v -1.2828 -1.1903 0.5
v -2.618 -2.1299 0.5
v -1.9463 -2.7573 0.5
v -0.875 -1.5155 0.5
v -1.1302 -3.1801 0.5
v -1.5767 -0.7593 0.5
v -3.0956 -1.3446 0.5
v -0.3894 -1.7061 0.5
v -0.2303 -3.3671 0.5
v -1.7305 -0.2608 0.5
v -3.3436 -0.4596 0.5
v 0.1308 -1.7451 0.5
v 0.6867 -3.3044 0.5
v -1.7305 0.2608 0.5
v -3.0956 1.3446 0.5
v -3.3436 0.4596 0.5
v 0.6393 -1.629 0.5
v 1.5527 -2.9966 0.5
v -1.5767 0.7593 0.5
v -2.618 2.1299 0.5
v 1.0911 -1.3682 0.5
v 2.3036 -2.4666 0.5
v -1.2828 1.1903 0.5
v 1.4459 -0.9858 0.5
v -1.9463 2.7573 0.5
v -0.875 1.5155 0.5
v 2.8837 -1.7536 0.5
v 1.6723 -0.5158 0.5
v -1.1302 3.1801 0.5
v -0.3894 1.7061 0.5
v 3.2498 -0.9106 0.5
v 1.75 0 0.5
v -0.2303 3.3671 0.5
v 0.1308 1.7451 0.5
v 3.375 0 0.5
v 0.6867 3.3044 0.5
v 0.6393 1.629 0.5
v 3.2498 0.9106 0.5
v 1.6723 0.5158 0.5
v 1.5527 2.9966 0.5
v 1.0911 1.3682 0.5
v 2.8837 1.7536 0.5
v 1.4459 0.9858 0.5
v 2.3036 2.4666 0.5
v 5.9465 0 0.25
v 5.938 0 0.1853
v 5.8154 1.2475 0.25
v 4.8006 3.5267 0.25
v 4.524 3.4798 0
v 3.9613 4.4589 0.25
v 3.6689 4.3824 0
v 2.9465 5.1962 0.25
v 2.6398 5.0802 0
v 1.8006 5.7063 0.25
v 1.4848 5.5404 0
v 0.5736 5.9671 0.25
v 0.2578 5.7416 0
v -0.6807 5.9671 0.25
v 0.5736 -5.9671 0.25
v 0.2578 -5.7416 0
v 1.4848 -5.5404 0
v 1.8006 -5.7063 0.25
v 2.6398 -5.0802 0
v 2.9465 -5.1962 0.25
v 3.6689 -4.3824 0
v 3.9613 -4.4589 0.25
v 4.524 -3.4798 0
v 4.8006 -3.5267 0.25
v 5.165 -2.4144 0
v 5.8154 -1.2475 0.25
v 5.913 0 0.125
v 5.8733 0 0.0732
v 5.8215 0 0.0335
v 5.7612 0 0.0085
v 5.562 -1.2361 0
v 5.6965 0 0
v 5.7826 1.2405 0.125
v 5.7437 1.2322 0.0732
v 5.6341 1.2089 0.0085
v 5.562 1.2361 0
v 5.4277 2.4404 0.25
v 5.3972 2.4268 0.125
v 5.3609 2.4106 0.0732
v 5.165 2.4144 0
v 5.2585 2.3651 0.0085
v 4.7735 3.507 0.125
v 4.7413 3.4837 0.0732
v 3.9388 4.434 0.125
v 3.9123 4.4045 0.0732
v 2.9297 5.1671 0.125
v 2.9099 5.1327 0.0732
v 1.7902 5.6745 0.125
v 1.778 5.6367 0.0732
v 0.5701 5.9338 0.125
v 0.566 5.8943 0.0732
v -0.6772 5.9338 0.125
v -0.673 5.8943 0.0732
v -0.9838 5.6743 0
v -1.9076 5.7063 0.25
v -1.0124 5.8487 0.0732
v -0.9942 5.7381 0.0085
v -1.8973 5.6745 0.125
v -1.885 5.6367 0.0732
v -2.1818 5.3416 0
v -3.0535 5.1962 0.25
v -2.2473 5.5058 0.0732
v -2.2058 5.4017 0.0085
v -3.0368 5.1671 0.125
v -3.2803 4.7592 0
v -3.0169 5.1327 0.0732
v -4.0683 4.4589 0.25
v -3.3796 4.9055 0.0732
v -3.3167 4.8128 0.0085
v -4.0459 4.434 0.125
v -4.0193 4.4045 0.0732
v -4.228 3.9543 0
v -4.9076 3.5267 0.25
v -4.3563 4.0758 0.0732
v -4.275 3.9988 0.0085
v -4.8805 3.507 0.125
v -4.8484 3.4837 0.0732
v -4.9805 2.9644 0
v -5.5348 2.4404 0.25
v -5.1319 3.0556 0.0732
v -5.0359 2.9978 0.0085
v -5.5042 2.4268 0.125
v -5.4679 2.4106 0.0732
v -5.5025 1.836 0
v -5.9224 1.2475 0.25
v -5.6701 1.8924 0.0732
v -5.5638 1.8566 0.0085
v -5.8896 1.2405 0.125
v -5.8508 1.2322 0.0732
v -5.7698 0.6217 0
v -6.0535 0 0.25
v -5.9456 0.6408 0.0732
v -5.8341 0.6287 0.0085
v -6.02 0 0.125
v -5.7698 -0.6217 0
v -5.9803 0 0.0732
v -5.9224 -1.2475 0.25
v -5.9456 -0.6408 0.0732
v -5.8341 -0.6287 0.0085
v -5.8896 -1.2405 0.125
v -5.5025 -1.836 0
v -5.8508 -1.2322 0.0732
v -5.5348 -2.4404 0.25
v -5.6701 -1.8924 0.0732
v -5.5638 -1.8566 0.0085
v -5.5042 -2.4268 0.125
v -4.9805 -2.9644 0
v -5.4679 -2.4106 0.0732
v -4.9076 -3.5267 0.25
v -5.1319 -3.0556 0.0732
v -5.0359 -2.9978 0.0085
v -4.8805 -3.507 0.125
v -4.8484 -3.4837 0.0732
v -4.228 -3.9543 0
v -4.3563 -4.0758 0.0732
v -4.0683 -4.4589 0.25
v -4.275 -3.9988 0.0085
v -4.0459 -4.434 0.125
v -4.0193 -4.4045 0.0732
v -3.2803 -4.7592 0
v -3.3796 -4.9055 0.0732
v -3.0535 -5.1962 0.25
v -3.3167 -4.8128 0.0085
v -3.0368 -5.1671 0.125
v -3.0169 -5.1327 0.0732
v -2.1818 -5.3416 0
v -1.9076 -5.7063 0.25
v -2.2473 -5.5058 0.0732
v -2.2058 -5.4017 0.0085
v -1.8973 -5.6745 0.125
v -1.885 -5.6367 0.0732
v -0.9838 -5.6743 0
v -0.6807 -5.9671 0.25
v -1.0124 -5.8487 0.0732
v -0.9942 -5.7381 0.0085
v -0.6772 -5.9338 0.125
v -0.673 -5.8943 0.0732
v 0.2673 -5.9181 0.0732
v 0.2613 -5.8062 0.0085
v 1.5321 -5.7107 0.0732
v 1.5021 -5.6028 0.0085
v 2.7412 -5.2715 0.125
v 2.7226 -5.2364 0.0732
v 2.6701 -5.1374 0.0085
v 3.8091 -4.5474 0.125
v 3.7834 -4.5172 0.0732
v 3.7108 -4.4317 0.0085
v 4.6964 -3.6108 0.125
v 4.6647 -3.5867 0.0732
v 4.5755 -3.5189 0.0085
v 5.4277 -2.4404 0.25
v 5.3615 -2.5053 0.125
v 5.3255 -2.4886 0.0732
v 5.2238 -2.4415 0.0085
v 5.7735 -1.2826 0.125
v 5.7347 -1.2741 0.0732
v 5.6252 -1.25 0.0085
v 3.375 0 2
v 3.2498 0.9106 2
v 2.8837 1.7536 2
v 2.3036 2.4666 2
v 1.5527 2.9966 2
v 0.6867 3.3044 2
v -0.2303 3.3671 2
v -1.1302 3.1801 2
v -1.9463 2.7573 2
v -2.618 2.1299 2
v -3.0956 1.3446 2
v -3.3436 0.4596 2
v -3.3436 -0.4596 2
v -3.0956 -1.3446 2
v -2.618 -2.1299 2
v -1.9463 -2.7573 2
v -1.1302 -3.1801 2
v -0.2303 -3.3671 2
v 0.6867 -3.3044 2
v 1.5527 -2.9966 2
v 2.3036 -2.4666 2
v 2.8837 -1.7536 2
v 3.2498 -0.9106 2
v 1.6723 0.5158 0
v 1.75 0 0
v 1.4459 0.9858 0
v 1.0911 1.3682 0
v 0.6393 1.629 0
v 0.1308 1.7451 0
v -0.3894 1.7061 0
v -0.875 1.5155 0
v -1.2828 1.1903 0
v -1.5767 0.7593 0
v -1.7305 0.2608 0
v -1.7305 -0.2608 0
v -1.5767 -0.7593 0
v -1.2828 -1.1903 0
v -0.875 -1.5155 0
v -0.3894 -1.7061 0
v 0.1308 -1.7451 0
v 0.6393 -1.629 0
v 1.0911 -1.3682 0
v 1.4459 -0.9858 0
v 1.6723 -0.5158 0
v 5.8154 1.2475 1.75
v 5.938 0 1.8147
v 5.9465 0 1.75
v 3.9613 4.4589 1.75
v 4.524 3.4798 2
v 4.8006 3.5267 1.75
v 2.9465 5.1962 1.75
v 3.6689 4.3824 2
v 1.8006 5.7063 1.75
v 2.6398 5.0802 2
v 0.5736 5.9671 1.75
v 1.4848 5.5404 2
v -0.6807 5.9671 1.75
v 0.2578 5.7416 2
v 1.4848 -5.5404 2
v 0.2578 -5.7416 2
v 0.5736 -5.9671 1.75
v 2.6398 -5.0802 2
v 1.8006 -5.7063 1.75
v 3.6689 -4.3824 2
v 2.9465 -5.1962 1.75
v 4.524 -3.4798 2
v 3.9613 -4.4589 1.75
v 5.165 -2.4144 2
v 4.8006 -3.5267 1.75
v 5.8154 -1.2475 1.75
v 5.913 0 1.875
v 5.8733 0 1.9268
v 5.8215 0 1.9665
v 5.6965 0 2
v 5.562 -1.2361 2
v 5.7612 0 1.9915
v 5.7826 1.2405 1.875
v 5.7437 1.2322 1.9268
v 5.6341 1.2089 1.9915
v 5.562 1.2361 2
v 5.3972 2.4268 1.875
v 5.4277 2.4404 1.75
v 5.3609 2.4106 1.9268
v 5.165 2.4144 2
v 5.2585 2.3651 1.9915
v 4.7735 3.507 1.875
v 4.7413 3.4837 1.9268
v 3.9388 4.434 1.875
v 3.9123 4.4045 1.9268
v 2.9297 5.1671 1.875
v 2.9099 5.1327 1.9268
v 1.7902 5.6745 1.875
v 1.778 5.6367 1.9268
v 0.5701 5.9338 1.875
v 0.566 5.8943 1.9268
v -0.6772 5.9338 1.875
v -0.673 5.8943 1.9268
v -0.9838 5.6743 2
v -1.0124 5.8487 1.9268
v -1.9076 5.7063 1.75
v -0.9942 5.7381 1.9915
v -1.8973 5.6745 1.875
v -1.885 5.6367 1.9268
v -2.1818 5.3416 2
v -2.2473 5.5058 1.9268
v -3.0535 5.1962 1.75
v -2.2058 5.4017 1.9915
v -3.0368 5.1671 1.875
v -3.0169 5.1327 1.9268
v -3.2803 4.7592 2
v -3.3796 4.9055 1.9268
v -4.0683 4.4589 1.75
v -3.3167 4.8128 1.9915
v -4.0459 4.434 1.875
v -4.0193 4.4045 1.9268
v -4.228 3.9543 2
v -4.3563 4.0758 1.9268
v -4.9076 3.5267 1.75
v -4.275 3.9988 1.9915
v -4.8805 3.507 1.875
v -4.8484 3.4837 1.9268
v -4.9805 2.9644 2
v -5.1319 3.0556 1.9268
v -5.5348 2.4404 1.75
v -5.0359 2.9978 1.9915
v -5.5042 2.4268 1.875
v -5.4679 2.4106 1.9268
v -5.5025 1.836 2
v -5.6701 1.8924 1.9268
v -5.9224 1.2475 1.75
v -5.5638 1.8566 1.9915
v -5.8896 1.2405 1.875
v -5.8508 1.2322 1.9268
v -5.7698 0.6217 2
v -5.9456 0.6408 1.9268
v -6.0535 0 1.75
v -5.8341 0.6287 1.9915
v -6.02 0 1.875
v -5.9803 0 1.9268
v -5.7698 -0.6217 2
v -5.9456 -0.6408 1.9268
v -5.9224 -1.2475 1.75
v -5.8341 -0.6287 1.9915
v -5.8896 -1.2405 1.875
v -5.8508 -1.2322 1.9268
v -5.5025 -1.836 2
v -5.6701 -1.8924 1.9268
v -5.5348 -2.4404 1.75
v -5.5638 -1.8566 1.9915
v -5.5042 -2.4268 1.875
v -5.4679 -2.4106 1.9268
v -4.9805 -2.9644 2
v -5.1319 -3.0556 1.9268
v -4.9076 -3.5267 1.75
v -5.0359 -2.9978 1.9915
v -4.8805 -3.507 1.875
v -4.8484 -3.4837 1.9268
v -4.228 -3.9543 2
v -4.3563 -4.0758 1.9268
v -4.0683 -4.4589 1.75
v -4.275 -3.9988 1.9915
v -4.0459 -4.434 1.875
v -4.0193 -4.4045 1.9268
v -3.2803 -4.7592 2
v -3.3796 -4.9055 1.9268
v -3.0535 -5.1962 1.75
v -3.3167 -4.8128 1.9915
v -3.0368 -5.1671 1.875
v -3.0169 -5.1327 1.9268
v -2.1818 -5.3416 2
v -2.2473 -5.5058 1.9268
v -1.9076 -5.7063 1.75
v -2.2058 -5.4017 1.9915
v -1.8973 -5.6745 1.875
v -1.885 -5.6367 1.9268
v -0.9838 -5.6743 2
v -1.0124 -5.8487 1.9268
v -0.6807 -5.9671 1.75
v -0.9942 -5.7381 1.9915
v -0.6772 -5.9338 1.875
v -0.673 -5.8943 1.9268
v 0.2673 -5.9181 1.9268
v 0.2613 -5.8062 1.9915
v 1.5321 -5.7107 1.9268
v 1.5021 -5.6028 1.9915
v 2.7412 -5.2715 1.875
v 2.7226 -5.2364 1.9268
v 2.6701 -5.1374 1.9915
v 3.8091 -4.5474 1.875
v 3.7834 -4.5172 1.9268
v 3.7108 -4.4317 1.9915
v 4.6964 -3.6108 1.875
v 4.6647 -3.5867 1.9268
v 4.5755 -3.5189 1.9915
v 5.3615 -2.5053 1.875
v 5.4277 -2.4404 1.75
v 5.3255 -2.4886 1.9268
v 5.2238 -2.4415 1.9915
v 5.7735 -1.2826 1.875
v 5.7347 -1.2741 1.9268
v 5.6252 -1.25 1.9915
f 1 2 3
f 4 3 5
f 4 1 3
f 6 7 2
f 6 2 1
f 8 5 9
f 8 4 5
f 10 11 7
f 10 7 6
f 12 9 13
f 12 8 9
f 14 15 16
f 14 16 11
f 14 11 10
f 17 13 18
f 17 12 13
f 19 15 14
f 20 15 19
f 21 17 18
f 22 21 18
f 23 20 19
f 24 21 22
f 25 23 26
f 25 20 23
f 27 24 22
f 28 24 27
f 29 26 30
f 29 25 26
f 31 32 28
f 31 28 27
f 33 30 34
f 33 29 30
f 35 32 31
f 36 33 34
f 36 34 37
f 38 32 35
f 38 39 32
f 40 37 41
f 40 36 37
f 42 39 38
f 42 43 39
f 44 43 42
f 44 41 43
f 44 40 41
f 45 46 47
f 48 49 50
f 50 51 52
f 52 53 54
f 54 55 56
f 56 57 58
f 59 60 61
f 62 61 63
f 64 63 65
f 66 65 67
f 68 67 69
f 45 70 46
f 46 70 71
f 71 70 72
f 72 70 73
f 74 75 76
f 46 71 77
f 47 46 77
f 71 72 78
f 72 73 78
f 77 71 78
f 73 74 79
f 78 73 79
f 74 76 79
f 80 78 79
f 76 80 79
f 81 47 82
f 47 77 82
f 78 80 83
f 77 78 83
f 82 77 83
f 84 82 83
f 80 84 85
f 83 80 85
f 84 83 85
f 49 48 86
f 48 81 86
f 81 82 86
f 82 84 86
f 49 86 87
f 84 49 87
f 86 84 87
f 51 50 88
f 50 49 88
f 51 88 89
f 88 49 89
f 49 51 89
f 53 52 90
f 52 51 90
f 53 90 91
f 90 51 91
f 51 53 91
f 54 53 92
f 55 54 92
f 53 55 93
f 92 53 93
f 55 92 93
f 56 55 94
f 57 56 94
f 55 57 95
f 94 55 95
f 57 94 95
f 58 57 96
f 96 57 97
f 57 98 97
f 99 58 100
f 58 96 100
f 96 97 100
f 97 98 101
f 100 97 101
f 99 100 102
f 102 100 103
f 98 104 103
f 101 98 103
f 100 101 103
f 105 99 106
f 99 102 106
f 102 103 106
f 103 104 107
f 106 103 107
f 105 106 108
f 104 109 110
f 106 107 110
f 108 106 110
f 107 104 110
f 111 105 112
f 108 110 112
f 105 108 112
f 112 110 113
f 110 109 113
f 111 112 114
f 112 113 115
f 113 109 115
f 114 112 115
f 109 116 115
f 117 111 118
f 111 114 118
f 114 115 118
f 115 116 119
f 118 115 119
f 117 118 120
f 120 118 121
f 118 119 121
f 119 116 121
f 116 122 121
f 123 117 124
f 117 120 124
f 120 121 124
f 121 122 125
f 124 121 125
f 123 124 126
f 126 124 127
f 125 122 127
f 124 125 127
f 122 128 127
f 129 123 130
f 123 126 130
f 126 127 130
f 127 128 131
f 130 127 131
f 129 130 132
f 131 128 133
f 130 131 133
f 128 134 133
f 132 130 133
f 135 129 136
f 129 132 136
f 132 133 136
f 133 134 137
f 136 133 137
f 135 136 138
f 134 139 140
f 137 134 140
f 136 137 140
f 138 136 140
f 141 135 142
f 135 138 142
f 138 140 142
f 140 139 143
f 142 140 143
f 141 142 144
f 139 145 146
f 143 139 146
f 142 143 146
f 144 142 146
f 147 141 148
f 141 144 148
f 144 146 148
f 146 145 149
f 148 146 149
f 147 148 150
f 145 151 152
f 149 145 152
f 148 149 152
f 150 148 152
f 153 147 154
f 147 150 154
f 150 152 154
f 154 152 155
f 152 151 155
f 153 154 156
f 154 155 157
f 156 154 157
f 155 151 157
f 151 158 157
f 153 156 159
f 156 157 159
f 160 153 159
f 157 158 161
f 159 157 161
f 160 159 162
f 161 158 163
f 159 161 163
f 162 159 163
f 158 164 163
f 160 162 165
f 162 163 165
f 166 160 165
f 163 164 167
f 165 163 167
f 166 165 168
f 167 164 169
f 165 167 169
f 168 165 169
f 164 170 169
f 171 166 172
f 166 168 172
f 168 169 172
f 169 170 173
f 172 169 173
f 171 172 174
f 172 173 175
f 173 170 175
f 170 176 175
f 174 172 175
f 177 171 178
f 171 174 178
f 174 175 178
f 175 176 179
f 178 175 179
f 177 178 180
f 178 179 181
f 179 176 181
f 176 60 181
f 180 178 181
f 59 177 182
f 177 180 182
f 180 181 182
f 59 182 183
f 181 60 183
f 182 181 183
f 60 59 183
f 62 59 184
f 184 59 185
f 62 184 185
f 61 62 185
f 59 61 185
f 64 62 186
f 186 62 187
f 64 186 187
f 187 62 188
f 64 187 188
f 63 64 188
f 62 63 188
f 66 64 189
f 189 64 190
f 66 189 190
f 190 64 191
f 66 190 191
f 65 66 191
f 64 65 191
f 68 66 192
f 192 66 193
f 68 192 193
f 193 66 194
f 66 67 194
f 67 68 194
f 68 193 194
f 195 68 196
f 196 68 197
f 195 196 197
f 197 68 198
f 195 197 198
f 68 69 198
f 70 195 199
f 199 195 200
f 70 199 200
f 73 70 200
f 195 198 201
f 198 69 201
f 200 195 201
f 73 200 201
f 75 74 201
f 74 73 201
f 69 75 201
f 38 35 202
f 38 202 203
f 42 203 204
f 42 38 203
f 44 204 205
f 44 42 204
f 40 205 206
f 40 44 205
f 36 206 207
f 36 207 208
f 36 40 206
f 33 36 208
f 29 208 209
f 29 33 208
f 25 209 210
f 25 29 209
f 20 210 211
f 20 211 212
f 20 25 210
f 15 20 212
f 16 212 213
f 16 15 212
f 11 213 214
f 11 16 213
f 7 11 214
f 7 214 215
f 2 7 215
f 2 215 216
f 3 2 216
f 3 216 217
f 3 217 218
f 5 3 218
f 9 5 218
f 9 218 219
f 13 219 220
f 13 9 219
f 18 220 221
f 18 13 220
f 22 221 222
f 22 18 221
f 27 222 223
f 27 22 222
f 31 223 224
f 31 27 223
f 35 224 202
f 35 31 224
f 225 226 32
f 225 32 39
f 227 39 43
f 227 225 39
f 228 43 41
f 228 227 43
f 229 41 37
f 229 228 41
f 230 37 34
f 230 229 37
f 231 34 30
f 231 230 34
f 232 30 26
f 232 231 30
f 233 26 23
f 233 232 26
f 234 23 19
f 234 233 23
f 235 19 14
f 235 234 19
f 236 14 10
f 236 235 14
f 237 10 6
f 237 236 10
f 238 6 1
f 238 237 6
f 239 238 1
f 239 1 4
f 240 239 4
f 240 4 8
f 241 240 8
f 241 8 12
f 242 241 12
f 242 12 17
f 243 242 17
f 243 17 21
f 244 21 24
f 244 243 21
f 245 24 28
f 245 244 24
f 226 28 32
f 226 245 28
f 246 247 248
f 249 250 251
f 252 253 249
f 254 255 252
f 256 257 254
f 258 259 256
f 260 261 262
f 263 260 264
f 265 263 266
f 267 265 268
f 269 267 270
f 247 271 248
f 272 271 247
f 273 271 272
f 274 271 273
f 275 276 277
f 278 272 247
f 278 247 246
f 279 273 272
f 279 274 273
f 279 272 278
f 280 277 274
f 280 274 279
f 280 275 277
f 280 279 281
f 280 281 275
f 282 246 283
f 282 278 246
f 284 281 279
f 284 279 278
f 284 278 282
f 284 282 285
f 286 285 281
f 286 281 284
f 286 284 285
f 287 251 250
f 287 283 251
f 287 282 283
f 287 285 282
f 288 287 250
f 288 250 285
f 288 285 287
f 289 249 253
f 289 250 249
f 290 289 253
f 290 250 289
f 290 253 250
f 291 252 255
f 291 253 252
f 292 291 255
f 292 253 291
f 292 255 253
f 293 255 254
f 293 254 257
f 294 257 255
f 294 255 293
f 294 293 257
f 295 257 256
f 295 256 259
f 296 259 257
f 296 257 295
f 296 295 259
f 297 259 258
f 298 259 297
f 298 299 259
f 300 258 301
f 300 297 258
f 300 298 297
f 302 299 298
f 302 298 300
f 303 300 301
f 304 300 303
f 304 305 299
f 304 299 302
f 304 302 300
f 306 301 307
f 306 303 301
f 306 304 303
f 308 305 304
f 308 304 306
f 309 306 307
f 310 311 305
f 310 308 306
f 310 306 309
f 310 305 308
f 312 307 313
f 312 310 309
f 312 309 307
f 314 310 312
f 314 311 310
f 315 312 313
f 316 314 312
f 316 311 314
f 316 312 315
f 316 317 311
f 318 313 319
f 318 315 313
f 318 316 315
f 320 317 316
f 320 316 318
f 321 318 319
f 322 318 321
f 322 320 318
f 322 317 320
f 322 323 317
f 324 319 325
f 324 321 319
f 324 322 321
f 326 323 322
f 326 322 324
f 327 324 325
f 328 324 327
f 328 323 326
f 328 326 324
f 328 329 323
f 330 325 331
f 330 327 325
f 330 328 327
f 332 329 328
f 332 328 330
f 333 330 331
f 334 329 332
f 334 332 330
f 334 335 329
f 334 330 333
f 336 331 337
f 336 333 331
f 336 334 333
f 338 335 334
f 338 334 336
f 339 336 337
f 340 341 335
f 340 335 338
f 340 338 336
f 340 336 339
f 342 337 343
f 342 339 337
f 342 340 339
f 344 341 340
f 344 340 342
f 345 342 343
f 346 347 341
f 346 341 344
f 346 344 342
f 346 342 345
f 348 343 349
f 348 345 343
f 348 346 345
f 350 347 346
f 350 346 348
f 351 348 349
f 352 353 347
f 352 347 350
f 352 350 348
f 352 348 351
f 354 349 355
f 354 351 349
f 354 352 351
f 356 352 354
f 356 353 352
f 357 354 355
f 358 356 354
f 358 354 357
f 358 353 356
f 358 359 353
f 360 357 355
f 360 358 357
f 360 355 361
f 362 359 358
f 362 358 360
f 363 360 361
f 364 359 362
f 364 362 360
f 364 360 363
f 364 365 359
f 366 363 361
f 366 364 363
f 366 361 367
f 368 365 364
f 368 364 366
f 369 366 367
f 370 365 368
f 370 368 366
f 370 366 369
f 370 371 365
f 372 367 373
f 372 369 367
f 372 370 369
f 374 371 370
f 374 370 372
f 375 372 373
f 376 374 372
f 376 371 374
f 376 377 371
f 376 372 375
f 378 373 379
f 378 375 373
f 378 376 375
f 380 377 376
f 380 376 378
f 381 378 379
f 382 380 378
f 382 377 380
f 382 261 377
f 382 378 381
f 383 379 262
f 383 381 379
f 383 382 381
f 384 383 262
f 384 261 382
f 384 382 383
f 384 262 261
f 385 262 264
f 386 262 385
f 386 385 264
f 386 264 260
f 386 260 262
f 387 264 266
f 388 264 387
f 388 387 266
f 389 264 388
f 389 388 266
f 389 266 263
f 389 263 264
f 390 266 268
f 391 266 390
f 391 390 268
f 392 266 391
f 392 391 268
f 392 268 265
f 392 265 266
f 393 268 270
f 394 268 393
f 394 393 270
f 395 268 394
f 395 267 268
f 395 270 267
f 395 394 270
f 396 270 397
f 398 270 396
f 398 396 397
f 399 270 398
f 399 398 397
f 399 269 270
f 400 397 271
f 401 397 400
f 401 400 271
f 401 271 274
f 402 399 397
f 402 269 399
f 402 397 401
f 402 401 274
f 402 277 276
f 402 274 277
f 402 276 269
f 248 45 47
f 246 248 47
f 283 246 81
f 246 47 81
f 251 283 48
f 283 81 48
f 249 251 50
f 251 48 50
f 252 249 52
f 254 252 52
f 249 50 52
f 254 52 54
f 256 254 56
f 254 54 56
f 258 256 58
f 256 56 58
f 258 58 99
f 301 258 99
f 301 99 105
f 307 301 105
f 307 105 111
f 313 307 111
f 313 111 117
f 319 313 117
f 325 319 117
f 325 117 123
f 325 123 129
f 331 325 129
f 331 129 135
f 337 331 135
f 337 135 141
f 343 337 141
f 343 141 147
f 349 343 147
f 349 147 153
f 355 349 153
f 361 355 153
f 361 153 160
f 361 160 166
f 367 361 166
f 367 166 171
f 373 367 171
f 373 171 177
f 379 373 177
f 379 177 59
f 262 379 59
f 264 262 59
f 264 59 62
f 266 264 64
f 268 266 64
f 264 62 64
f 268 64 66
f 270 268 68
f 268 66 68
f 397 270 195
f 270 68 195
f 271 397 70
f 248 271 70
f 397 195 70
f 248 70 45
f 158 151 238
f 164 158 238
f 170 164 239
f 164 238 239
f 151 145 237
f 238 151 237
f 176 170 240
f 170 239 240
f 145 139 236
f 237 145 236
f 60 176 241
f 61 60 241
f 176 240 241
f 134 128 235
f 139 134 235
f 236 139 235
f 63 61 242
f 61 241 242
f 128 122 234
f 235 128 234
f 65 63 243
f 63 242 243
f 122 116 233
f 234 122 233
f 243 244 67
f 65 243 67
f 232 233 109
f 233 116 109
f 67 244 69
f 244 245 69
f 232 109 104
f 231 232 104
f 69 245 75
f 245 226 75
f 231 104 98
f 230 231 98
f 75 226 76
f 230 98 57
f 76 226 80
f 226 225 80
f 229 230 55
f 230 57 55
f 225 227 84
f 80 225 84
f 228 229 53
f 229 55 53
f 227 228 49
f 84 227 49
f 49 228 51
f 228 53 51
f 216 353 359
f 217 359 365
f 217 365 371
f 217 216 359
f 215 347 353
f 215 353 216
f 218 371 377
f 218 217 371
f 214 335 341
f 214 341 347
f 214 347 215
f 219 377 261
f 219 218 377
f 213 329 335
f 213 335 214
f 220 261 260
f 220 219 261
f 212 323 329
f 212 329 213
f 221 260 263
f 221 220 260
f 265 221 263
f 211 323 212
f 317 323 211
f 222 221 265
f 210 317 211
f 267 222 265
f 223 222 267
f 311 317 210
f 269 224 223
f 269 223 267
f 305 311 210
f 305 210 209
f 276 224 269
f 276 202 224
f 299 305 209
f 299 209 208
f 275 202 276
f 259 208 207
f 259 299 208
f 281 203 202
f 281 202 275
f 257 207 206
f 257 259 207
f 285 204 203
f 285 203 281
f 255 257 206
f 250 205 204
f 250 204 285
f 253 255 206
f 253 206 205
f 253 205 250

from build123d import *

# Parameters (mm, degrees)
SKETCH1_R           = 6
SKETCH1_R_2         = 1.75
BOSS_EXTRUDE1_DEPTH = 0.5
SKETCH2_R           = 6
SKETCH2_R_2         = 3.375
BOSS_EXTRUDE2_DEPTH = 1.5
FILLET1_R           = 0.25


with BuildPart() as part:
    # Sketch1 → Boss-Extrude1 (new body)
    with BuildSketch(Plane.XY):
        with Locations((-0.053524078, 0)):
            Circle(SKETCH1_R)
        Circle(SKETCH1_R_2, mode=Mode.SUBTRACT)
    extrude(amount=BOSS_EXTRUDE1_DEPTH)

    # Sketch2 → Boss-Extrude2 (add)
    with BuildSketch(Plane.XY.offset(0.5)):
        with Locations((-0.053524078, 0)):
            Circle(SKETCH2_R)
        Circle(SKETCH2_R_2, mode=Mode.SUBTRACT)
    extrude(amount=BOSS_EXTRUDE2_DEPTH)

    # Fillet1
    fillet1_edges = [part.edges().sort_by_distance(p)[0] for p in [
        (-6.053524078, 0, 2),
        (-6.053524078, 0, 0),
    ]]
    fillet(fillet1_edges, radius=FILLET1_R)


solid = part.part
